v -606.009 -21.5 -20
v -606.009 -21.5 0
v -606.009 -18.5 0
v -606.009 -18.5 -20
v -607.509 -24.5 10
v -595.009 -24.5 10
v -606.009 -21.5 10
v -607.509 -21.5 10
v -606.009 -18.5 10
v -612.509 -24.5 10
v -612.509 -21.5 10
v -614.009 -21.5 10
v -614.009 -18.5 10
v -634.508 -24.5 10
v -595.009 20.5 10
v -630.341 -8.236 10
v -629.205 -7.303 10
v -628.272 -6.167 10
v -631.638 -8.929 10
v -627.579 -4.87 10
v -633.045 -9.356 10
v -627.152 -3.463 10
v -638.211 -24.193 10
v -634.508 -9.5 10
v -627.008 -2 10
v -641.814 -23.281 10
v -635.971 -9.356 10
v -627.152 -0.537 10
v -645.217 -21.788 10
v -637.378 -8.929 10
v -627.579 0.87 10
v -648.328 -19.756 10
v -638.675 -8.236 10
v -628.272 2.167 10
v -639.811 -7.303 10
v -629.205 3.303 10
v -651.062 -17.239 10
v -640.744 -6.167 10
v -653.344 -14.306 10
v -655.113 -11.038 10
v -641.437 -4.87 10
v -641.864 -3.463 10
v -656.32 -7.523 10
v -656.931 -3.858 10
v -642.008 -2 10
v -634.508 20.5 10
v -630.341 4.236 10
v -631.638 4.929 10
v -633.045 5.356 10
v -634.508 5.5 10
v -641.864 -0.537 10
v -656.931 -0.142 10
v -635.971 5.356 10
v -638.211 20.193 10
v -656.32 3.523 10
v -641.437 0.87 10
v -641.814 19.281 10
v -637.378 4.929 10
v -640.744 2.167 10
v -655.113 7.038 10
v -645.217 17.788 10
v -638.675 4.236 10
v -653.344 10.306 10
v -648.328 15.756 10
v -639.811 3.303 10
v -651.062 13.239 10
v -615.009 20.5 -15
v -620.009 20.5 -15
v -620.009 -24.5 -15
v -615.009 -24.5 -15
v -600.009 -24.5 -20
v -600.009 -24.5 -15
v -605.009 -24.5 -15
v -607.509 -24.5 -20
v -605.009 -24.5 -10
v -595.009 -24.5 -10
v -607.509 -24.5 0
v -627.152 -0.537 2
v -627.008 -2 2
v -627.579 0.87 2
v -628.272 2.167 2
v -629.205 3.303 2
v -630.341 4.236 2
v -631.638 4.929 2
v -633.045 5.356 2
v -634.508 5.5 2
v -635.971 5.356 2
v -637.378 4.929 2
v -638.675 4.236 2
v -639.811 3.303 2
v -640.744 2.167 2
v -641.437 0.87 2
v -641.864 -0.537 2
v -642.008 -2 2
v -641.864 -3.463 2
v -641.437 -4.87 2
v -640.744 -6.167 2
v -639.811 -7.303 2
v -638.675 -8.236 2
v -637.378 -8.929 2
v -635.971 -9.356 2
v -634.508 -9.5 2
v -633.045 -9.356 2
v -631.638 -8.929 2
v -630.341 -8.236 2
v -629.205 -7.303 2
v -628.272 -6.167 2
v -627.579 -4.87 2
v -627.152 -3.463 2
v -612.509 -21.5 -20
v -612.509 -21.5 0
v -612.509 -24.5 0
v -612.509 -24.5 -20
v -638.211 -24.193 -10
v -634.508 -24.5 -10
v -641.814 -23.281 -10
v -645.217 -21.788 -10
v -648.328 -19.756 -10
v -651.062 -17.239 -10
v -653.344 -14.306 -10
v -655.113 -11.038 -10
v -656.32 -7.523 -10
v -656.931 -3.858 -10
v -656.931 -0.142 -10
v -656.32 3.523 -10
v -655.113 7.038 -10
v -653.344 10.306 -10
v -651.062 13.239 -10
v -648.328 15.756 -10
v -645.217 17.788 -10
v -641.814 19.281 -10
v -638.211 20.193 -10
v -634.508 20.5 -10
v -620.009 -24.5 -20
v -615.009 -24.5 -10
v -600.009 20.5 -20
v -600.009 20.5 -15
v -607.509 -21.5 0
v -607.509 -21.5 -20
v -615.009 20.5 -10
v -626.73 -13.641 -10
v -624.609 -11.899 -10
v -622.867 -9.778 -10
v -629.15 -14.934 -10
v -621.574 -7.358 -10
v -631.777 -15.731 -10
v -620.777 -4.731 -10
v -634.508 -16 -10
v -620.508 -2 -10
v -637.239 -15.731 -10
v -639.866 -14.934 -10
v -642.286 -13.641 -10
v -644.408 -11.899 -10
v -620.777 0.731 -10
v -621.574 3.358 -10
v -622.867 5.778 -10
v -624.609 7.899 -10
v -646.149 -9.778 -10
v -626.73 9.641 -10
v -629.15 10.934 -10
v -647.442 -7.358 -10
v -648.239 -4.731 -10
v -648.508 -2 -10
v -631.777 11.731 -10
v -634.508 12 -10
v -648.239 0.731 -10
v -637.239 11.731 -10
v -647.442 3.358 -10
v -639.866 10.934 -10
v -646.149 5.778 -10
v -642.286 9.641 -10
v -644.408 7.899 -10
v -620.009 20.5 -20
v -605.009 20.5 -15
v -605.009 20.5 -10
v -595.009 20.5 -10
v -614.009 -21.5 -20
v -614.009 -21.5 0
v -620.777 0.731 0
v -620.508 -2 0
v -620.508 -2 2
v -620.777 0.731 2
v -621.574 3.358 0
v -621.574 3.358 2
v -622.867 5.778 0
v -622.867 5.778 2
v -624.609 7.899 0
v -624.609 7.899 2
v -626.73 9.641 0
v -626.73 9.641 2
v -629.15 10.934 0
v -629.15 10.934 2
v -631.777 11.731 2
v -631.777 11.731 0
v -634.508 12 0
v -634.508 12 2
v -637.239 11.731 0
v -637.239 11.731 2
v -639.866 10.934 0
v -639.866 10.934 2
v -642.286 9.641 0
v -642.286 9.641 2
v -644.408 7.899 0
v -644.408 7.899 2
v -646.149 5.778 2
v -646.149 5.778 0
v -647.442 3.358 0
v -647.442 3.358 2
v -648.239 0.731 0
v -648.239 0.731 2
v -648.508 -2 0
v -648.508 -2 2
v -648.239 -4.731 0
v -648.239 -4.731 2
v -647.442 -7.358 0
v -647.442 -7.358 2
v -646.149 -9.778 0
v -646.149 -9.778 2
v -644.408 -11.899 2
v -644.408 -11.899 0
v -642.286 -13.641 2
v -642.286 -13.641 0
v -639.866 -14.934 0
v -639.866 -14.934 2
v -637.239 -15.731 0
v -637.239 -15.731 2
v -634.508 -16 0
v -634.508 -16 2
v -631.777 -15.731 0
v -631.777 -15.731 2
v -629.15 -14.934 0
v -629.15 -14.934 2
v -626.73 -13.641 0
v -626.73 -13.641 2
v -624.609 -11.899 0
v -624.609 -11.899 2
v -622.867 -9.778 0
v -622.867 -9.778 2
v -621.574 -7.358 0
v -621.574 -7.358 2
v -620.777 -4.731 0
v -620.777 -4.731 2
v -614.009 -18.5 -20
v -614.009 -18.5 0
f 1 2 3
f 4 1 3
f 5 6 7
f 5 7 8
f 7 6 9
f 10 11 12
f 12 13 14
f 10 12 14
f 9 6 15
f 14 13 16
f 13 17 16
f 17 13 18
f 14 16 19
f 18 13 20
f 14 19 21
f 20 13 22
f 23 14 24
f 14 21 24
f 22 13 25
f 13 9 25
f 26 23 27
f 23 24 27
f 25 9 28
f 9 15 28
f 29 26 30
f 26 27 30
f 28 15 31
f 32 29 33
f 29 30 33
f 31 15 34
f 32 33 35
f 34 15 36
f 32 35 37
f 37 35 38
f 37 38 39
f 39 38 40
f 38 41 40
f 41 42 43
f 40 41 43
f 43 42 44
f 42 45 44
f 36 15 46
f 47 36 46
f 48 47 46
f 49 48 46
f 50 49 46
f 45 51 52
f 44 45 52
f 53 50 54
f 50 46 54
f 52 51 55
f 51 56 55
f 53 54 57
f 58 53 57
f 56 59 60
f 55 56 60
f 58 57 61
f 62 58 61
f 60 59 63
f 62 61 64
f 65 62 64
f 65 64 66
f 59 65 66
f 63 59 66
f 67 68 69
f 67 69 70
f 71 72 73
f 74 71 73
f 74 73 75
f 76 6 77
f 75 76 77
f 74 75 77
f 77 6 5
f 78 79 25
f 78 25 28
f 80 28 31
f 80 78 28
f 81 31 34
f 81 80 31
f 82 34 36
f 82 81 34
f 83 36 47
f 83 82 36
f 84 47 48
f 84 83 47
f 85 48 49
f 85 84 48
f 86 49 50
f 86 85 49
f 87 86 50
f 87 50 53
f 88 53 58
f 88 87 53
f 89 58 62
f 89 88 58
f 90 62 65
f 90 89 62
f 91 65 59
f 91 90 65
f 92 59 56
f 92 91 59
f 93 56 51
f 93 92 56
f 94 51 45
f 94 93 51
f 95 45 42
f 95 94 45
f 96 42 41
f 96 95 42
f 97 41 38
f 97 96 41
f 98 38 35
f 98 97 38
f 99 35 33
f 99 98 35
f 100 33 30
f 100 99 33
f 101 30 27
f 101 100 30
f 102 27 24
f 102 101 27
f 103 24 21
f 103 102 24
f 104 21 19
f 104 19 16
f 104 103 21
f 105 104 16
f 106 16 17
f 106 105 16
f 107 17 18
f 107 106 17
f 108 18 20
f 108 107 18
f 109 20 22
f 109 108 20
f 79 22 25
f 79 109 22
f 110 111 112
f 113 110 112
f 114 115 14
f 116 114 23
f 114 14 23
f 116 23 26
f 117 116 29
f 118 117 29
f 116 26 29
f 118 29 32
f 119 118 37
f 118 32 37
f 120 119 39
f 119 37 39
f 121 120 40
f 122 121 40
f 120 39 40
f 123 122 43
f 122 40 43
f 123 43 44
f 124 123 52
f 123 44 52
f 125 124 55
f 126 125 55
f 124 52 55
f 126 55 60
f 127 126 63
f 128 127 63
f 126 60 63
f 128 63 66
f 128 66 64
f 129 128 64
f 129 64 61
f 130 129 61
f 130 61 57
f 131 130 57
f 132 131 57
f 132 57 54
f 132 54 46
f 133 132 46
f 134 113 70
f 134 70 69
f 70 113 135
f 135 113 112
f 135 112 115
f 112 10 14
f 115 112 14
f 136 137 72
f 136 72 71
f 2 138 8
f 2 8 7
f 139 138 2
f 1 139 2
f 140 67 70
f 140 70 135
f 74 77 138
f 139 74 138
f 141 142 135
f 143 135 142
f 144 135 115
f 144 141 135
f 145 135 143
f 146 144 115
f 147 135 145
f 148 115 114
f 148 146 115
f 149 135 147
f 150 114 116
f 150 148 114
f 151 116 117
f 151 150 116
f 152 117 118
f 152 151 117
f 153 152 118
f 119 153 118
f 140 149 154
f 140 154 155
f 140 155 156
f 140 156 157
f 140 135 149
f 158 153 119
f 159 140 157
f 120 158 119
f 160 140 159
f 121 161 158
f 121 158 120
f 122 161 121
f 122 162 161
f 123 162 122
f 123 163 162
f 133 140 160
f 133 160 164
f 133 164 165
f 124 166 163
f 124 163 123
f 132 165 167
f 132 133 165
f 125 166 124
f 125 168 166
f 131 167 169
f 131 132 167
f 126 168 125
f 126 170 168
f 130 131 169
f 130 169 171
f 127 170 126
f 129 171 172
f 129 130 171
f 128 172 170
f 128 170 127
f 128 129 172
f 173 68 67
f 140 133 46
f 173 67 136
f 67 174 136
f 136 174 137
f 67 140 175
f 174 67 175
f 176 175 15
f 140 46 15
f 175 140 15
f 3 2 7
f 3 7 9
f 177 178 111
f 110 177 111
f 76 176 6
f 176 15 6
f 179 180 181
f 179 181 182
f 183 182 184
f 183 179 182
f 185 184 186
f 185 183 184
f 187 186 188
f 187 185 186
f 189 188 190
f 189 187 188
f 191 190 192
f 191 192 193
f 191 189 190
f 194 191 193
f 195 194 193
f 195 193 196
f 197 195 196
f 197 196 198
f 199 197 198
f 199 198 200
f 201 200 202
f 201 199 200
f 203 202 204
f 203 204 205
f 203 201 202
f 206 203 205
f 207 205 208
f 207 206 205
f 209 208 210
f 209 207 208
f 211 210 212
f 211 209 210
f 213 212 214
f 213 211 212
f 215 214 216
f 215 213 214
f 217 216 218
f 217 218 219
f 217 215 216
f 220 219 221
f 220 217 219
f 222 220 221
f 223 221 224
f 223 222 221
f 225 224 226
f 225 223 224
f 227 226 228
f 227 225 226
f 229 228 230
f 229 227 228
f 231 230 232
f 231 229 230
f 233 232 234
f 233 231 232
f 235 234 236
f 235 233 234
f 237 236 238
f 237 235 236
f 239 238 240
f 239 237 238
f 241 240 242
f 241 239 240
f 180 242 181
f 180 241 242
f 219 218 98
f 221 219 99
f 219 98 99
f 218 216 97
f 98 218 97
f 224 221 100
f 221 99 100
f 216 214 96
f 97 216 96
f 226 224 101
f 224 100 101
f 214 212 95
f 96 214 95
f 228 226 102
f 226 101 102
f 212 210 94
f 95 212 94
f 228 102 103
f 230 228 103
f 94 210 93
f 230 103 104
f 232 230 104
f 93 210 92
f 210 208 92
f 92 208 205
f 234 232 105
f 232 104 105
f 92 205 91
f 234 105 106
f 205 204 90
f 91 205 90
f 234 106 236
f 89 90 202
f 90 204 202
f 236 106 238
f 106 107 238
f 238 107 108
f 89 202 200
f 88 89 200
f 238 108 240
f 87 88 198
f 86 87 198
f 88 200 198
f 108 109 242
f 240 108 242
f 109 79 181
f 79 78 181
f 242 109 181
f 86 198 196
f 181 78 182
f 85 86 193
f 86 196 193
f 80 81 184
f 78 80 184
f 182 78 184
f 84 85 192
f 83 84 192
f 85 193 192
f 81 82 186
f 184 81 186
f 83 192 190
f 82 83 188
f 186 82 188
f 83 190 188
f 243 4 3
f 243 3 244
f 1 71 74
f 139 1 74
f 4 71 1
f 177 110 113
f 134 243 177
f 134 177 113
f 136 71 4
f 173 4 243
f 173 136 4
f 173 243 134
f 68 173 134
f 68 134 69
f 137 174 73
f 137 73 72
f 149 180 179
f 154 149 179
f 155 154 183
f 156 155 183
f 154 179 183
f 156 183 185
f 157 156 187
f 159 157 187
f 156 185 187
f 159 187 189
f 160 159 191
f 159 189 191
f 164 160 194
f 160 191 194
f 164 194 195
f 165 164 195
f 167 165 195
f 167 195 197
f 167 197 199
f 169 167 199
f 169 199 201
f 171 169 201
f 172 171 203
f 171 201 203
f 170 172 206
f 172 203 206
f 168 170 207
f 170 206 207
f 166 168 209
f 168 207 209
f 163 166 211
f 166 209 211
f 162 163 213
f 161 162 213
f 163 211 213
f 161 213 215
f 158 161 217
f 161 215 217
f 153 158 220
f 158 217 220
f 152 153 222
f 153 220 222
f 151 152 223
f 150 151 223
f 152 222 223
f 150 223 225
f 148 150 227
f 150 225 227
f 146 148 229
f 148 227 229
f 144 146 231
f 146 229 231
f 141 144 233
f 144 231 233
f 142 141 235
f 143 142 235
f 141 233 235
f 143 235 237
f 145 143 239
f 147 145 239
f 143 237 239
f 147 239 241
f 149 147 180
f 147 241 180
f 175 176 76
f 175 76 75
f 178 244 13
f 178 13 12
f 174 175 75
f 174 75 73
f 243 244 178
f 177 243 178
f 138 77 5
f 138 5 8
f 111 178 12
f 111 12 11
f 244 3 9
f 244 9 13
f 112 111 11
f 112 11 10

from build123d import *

# Parameters (mm, degrees)
ESQUISSE1_R                  = 7.5
BOSS_EXTRU_1_DEPTH           = 10
ESQUISSE1_5_R                = 14
ENL_V_MAT_EXTRU_1_DEPTH      = 2
ENL_V_MAT_EXTRU_1_DEPTH_BACK = 10
BOSS_EXTRU_2_DEPTH           = 45
ENL_V_MAT_EXTRU_2_DEPTH      = 11
ENL_V_MAT_EXTRU_2_DEPTH_BACK = 21


with BuildPart() as part:
    # Esquisse1 → Boss.-Extru.1 (new body, symmetric)
    with BuildSketch(Plane.XY):
        with BuildLine():
            Line((-634.508066615, 20.5), (-595.008671928, 20.5))
            Line((-595.008671928, 20.5), (-595.008671928, -24.5))
            Line((-595.008671928, -24.5), (-634.508066615, -24.5))
            ThreePointArc((-634.508066615, -24.5), (-657.008066615, -2), (-634.508066615, 20.5))
        make_face()
        with Locations((-634.508066615, -2)):
            Circle(ESQUISSE1_R, mode=Mode.SUBTRACT)
    extrude(amount=BOSS_EXTRU_1_DEPTH, both=True)

    # Esquisse1_5 → Enl_v. mat.-Extru.1 (cut, two sides)
    with BuildSketch(Plane.XY) as enl_v_mat_extru_1_sk:
        with Locations((-634.508066615, -2)):
            Circle(ESQUISSE1_5_R)
    extrude(amount=ENL_V_MAT_EXTRU_1_DEPTH, mode=Mode.SUBTRACT)
    extrude(enl_v_mat_extru_1_sk.sketch, amount=-ENL_V_MAT_EXTRU_1_DEPTH_BACK, mode=Mode.SUBTRACT)

    # Esquisse2 → Boss.-Extru.2 (add)
    with BuildSketch(Plane(origin=(0, 20.5, 0), x_dir=(1, 0, 0), z_dir=(0, 1, 0))):
        Polygon((-605.008671928, 10), (-605.008671928, 15), (-600.008671928, 15), (-600.008671928, 20), (-620.008671928, 20), (-620.008671928, 15), (-615.008671928, 15), (-615.008671928, 10), align=None)
    extrude(amount=-BOSS_EXTRU_2_DEPTH)

    # Esquisse1_7 → Enl_v. mat.-Extru.2 (cut, two sides)
    with BuildSketch(Plane.XY) as enl_v_mat_extru_2_sk:
        Polygon((-612.508671928, -21.5), (-612.508671928, -24.5), (-607.508671928, -24.5), (-607.508671928, -21.5), (-606.008671928, -21.5), (-606.008671928, -18.5), (-614.008671928, -18.5), (-614.008671928, -21.5), align=None)
    extrude(amount=ENL_V_MAT_EXTRU_2_DEPTH, mode=Mode.SUBTRACT)
    extrude(enl_v_mat_extru_2_sk.sketch, amount=-ENL_V_MAT_EXTRU_2_DEPTH_BACK, mode=Mode.SUBTRACT)


solid = part.part
